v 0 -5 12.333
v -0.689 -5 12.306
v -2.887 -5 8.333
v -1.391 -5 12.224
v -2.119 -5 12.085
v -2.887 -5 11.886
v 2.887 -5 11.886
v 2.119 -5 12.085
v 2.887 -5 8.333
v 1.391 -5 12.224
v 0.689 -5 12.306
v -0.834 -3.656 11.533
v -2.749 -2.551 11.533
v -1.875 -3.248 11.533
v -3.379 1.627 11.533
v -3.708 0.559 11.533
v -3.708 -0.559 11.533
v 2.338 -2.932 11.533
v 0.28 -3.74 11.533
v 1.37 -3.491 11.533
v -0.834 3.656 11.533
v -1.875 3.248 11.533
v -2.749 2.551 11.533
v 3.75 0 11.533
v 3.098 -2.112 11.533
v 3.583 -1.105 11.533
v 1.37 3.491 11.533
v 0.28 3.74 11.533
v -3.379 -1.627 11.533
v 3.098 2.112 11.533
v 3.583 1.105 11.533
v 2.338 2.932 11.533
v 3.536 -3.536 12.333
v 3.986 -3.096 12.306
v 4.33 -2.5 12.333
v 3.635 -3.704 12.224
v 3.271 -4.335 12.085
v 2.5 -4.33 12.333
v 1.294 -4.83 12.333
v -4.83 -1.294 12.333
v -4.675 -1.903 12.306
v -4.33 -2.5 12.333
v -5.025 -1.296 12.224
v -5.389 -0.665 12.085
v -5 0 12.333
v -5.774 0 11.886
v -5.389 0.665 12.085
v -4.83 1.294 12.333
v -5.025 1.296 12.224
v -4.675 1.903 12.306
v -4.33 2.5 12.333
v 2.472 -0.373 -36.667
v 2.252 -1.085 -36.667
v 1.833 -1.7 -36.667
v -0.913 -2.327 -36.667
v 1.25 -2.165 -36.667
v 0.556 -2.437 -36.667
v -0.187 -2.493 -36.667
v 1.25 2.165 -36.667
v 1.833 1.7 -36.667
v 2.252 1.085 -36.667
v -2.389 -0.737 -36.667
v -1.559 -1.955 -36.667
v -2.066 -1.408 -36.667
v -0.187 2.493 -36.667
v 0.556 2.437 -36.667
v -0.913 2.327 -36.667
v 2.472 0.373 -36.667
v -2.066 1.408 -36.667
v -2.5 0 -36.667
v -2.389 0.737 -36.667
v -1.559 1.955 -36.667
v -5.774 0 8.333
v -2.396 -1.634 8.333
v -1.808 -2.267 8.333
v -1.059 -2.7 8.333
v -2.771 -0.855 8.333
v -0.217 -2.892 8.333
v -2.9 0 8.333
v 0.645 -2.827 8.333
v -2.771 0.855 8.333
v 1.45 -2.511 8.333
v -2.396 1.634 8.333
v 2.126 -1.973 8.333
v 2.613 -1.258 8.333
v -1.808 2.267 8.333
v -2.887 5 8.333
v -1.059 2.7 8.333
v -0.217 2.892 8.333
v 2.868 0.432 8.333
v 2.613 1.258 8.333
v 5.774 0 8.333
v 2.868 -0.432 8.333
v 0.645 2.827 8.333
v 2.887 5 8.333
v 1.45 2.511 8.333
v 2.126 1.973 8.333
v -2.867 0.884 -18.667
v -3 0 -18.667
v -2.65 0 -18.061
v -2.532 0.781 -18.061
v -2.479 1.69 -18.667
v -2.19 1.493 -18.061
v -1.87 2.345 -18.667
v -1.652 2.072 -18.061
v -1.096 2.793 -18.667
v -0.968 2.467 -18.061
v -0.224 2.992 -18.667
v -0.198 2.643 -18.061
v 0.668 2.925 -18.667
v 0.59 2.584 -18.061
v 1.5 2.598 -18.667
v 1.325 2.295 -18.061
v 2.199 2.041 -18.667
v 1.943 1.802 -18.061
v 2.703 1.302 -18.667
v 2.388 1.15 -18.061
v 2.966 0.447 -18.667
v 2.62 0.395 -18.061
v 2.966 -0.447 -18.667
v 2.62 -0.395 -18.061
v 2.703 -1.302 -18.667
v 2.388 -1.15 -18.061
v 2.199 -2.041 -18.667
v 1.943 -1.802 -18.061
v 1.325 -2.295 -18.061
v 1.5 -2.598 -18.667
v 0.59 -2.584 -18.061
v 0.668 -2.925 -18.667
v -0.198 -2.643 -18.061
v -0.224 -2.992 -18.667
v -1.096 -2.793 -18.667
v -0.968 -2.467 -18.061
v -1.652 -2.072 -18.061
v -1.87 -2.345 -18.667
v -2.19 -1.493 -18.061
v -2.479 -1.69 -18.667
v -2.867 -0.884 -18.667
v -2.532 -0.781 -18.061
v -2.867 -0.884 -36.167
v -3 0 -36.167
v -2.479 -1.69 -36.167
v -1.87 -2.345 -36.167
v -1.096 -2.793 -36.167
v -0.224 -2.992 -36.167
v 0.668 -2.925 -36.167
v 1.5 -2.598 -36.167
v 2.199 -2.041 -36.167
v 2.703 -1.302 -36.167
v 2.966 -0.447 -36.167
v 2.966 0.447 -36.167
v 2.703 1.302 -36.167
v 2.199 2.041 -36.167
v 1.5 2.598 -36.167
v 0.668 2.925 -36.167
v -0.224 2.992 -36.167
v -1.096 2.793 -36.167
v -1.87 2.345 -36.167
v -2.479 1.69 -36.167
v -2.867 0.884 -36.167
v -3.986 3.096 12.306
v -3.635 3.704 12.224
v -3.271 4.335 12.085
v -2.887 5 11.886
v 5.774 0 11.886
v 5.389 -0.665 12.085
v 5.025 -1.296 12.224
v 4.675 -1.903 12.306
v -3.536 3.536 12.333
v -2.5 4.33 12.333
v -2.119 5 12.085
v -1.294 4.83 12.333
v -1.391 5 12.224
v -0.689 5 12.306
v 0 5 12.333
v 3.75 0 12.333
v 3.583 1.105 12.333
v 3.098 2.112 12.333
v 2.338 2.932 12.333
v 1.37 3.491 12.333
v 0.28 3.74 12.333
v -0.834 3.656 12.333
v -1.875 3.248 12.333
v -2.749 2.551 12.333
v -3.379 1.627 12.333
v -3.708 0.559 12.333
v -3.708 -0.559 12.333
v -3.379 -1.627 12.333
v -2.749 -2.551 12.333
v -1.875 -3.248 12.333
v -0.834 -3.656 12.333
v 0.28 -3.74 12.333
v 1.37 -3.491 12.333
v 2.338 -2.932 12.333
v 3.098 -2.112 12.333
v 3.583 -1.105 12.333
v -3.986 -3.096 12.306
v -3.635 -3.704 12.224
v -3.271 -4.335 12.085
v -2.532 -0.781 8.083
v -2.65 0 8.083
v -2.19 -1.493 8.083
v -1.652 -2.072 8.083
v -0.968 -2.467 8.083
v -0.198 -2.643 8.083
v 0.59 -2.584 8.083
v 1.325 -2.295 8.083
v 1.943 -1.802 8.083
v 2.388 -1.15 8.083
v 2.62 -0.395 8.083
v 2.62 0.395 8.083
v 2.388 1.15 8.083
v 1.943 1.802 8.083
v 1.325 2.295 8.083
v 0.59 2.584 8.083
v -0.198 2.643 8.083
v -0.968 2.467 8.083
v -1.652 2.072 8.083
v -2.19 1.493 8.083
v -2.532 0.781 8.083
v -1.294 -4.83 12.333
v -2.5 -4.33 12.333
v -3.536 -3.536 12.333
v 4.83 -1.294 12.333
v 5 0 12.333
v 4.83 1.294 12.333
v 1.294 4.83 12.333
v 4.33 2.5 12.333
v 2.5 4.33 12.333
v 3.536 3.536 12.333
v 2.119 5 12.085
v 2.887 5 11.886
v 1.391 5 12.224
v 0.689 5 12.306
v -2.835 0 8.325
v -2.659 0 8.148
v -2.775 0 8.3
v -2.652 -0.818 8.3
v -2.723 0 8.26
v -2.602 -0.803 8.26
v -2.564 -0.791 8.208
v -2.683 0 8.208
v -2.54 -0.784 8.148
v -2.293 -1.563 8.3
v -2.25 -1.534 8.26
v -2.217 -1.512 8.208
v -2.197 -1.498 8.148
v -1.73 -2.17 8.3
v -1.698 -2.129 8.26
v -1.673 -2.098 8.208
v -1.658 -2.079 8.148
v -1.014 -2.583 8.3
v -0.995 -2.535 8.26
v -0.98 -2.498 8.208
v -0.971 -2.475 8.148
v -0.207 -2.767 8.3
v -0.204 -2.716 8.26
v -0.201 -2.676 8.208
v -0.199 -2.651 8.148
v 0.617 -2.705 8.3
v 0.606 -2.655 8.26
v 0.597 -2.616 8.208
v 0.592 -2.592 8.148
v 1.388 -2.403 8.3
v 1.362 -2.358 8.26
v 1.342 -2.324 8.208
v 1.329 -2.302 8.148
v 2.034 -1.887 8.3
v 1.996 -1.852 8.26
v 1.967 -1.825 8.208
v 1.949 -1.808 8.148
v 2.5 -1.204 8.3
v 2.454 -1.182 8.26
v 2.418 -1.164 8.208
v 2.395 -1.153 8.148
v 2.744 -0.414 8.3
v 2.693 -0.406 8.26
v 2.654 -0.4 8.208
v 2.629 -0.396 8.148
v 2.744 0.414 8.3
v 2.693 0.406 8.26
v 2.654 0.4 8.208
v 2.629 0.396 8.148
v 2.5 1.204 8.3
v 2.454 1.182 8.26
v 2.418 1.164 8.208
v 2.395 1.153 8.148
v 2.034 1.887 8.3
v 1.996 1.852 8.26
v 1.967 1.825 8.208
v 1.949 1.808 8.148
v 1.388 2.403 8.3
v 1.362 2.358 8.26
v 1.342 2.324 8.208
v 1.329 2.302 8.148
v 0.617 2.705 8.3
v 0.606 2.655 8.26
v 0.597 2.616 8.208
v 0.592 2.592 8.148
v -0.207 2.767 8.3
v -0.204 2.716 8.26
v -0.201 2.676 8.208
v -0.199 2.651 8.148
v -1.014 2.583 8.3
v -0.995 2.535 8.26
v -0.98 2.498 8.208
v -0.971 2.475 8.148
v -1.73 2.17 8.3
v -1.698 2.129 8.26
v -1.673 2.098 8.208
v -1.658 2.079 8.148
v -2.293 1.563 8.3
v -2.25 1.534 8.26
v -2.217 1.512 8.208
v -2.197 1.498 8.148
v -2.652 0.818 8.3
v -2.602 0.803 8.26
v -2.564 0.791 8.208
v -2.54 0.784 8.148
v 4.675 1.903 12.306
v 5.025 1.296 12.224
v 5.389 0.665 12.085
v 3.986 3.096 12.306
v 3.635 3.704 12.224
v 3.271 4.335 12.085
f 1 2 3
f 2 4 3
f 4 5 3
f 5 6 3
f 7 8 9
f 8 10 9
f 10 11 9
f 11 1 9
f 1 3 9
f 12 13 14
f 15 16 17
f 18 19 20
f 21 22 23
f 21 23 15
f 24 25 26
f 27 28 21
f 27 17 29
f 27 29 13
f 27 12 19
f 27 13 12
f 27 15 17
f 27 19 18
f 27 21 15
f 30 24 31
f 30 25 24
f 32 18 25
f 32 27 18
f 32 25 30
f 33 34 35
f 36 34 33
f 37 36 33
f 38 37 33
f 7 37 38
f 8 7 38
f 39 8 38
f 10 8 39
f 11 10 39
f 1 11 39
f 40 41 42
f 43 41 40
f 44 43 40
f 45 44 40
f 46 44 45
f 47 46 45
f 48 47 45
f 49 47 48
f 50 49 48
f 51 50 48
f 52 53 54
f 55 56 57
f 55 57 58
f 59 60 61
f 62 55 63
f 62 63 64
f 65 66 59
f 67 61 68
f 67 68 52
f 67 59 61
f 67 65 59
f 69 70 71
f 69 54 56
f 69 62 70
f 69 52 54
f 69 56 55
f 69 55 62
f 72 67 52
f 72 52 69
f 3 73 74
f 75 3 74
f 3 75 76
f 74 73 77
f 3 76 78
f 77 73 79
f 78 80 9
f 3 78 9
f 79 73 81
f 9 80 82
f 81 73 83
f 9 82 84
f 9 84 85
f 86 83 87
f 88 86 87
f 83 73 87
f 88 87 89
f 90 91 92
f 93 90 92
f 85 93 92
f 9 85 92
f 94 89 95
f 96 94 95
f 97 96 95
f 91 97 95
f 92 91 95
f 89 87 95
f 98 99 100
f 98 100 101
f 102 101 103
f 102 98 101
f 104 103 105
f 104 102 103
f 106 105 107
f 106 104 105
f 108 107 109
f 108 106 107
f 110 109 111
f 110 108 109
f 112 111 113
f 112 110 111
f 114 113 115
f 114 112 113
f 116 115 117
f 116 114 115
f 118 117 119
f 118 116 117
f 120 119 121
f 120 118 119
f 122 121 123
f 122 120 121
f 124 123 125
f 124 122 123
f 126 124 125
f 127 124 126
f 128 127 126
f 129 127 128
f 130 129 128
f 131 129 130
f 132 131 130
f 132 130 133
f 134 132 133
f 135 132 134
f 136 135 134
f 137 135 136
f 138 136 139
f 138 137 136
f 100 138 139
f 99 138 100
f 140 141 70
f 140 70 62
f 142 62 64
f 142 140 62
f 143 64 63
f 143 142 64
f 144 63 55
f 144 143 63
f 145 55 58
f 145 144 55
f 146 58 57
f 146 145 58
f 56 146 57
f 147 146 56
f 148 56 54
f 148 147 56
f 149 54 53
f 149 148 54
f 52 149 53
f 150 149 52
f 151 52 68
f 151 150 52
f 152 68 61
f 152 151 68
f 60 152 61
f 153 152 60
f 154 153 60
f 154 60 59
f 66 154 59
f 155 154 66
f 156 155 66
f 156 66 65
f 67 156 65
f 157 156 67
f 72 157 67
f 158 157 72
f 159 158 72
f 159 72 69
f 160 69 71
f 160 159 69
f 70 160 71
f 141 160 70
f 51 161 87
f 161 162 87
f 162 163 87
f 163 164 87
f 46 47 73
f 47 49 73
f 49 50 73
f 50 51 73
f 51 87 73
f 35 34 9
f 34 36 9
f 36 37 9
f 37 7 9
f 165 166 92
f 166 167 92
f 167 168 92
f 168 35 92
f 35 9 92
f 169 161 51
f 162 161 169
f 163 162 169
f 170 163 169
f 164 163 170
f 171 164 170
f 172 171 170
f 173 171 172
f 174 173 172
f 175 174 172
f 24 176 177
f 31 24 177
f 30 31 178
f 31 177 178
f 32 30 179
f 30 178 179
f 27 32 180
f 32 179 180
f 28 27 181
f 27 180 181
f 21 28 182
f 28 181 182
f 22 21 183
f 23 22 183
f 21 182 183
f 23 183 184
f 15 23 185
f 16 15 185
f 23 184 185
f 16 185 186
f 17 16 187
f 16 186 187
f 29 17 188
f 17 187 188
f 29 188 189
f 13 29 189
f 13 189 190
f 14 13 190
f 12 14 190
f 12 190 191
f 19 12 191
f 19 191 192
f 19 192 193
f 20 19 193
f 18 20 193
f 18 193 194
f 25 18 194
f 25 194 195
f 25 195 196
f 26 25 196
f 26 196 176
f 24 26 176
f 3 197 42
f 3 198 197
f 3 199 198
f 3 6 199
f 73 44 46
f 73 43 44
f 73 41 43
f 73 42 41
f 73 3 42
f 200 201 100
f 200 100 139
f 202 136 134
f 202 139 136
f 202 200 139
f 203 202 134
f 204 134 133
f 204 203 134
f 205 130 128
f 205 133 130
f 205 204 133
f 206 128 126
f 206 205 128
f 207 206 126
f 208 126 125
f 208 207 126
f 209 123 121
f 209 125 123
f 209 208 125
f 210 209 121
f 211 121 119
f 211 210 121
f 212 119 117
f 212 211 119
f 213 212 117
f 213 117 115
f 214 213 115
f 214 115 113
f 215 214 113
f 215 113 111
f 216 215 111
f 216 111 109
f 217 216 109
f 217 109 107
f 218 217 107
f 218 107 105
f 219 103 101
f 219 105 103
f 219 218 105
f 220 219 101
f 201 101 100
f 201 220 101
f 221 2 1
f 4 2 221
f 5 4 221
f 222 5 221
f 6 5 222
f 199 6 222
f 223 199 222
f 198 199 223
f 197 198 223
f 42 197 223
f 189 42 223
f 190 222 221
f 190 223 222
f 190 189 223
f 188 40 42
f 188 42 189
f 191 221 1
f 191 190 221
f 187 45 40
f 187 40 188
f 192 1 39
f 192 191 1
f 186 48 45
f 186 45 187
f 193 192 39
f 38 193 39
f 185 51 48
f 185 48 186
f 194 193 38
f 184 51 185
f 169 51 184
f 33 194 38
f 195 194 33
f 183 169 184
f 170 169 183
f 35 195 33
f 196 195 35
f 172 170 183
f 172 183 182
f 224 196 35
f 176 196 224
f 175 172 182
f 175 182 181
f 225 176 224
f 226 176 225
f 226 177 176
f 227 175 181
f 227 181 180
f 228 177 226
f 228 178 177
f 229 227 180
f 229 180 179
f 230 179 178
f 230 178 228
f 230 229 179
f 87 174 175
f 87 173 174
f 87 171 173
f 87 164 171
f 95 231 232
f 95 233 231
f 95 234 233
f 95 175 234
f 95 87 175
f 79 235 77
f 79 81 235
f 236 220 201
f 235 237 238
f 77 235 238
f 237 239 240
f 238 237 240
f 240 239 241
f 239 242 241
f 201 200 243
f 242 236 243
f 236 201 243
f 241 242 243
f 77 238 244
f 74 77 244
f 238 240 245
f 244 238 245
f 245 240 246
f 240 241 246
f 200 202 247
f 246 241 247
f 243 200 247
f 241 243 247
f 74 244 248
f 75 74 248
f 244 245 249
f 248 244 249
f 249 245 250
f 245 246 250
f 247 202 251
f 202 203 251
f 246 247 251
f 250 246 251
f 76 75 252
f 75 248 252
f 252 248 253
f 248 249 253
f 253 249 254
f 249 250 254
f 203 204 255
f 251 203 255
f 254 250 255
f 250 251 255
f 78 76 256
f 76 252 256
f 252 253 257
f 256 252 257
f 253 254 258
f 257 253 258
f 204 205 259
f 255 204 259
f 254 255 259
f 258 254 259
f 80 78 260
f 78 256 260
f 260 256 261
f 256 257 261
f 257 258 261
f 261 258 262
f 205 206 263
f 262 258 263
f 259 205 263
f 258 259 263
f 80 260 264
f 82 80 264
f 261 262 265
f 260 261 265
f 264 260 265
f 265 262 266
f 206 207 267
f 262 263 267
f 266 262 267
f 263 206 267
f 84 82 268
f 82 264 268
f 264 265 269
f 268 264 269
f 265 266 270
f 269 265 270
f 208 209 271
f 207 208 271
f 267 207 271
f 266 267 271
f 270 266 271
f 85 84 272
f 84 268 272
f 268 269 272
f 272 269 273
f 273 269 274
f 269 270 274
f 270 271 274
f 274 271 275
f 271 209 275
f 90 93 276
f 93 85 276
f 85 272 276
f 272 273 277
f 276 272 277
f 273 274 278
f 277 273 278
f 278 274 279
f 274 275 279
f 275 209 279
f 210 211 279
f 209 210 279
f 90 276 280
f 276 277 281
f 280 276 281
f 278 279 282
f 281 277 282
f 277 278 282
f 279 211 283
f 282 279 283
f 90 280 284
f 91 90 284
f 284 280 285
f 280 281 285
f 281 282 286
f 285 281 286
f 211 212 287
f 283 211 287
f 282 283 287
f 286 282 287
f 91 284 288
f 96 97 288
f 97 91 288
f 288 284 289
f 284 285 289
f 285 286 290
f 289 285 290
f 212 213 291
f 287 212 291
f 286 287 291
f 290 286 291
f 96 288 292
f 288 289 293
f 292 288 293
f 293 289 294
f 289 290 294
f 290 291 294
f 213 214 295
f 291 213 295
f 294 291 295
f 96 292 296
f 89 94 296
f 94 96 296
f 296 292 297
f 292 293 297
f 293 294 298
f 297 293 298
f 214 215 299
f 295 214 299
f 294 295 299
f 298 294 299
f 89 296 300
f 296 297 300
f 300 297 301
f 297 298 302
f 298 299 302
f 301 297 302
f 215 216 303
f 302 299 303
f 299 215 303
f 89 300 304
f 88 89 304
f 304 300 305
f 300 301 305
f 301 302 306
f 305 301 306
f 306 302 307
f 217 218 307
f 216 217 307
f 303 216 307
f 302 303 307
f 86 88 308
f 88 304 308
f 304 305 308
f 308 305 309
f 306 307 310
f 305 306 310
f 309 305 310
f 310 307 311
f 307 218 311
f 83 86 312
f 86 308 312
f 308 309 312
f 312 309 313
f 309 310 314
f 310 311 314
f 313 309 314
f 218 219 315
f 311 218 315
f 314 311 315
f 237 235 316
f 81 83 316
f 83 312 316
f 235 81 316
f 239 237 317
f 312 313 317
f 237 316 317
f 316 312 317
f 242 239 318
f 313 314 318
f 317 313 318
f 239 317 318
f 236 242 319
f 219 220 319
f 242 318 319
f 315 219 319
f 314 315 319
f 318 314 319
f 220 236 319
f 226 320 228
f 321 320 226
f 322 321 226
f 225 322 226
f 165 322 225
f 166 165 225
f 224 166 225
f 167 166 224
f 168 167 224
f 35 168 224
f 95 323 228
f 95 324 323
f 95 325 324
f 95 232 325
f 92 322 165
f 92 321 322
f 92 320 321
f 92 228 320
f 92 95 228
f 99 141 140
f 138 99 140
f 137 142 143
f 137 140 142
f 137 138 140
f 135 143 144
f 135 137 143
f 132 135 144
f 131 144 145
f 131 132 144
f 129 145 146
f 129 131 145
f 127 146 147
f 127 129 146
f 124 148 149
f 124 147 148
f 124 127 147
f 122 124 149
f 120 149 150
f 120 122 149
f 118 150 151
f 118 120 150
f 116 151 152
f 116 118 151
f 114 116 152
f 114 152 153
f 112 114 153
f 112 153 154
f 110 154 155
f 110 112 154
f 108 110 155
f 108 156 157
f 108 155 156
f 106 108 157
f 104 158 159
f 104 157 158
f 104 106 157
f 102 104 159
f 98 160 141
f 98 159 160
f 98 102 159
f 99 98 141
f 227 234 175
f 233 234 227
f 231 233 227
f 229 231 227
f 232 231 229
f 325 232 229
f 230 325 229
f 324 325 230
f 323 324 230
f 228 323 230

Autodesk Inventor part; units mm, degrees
ref_plane "YZ Plane" through (0, 0, 0) normal (1, 0, 0) x (0, 1, 0)
sketch "Sketch2" plane through (0, 0, 0) normal (0, 1, 0) x (-1, 0, 0)
  line L0 (0, 8.3331) -> (0, -36.6669)
  line L1 (0, -36.6669) -> (2.5, -36.6669)
  line L2 (3, -36.1669) -> (3, -18.6669)
  line L3 (3, -18.6669) -> (2.65, -18.0607)
  line L4 (2.65, -18.0607) -> (2.65, 8.3331)
  line L5 (2.65, 8.3331) -> (0, 8.3331)
  line L6 (2.5, -36.6669) -> (3, -36.1669)
  line L7 (3, -36.6669) -> (3, -37.374)
  line L8 (0, -46.5155) -> (0, 17.4745) projected
  dimension "Ds" = 5.3
  dimension "NND" = 6
  dimension "b" = 18
  dimension "d3" = 30
  dimension "d5" = 45
  dimension "PTC" = 1
  dimension "NLG" = 45
revolve "Revolution1" add sketch "Sketch2" angle 360 about axis through (0, 0, 8.3331) along (0, 0, -1)
sketch "Sketch3" plane through (0, 0, 8.3331) normal (0, 0, 1) x (1, 0, 0)
  circle A0 centre (0, 0) radius 2.65 projected
  line L0 (0, 5) -> (2.8868, 5)
  line L1 (2.8868, 5) -> (5.7735, 0)
  line L2 (5.7735, 0) -> (0, 0)
  line L3 (0, 0) -> (0, 5)
  line L4 (0, 5) -> (-2.8868, 5)
  line L5 (-2.8868, 5) -> (-5.7735, 0)
  line L6 (0, -5) -> (2.8868, -5)
  line L7 (2.8868, -5) -> (5.7735, 0)
  line L8 (-2.8868, -5) -> (-5.7735, 0)
  line L9 (0, -5) -> (-2.8868, -5)
  dimension "d9" = 60
  dimension "ParS" = 10
  dimension "msp_d11" = 10
extrude "Extrusion1" add sketch "Sketch3" along normal blind 4
sketch "Sketch4" plane through (0, 0, 0) normal (0, 1, 0) x (-1, 0, 0)
  line L0 (-5, 12.3331) -> (-5.7735, 12.3331)
  line L1 (-5.7735, 12.3331) -> (-5.7735, 11.8865)
  line L2 (-5.7735, 11.8865) -> (-5, 12.3331)
  line L3 (0, 4.4746) -> (0, 31.4838) projected
  line L4 (0, 27.6253) -> (0, 27.1787)
  line L5 (-5.7735, 8.3331) -> (-5.7735, 12.3331) projected
  line L6 (-2.8868, 12.3331) -> (-5.7735, 12.3331) projected
  dimension "d14" = 30
  dimension "msp_d15" = 10
revolve "Revolution2" cut sketch "Sketch4" angle 360 about axis through (0, 0, 27.6253) along (0, 0, -1)
sketch "Sketch5" plane through (0, 0, 12.3331) normal (0, 0, 1) x (1, 0, 0)
  arc A0 (4.3301, 2.5) -> (0, 5) centre (0, 0) ccw projected
  circle A1 centre (0, 0) radius 3.75
  dimension "d27" = 7.5
extrude "Extrusion2" cut sketch "Sketch5" against normal blind 0.8
thread "Thread1" size "M6x1" class "6g" standard "ISO Metric profile" full length
ref_plane "MSC_PF1" through (0, 0, 0) normal (0, 1, 0) x (-1, 0, 0)
ref_plane "MSC_PT1" through (0, 0, 8.3331) normal (0, 0, -1) x (-1, 0, 0)
fillet "Fillet1" radius 0.25 1 edges at (2.65, 0, 8.3331)
equation "\"msp_d11\" = ParS"
equation "\"msp_d15\" = ParS"
equation "\"d27\" = 0.75 * ParS"
equation "\"d28\" = 0.2 * ParK"
equation "\"d30\" = r"
equation "\"msp_d17\" = b"
equation "\"r\" = 0.25"
equation "\"THREADDIA\" = NND"
equation "\"ParK\" = 4"
properties part number "ISO 4015 - M6 x 45" material "Stainless Steel, 440C"
